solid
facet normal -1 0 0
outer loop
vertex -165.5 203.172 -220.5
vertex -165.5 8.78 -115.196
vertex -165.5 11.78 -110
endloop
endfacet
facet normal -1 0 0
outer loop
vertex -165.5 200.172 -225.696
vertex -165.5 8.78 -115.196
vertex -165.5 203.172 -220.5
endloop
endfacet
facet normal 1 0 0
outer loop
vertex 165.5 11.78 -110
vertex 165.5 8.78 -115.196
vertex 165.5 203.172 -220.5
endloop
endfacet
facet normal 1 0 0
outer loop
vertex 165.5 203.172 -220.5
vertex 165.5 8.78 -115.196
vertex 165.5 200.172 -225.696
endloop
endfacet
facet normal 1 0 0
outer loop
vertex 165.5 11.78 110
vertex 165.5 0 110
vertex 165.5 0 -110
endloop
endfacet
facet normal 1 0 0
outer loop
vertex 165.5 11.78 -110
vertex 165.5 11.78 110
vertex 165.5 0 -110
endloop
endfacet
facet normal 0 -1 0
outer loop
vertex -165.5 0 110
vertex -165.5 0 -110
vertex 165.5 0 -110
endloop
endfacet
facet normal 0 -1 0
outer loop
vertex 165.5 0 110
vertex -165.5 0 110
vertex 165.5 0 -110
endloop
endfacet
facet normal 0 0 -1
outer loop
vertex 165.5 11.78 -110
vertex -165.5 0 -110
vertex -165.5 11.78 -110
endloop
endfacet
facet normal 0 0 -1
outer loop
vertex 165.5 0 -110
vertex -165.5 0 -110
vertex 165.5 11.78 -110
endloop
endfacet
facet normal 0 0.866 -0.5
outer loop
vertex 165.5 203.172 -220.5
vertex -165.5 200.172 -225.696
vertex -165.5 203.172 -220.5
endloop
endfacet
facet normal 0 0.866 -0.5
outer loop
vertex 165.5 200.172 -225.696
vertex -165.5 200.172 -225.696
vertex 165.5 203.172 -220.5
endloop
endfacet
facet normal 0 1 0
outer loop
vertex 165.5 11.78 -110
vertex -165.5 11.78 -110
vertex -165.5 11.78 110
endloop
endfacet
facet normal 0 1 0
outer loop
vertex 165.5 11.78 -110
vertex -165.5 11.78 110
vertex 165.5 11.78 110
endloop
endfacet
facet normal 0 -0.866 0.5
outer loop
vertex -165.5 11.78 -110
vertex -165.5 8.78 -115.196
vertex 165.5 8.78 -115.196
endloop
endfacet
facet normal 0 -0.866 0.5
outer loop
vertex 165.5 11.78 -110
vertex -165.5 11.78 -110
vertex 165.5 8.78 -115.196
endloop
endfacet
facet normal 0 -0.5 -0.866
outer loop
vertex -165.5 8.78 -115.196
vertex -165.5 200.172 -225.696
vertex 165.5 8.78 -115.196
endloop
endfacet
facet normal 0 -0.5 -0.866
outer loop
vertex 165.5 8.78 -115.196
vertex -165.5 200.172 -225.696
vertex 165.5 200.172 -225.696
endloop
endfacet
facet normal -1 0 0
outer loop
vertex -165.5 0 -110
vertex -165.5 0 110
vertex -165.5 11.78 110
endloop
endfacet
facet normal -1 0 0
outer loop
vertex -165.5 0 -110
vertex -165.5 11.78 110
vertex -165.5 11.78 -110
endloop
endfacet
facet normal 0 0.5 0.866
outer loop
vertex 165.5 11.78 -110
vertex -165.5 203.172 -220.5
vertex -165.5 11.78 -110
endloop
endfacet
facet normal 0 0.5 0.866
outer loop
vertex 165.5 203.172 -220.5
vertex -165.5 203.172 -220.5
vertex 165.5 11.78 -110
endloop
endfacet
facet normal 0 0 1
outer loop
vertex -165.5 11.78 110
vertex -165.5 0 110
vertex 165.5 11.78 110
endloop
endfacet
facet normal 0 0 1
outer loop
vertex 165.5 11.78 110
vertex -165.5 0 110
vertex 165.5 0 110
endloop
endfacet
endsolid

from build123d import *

# Parameters (mm, degrees)
SKETCH1_W             = 331
SKETCH1_H             = 220
BOSS_EXTRUDE1_DEPTH   = 11.78
SKETCH2_W             = 331
SKETCH2_H             = 221
BOSS_EXTRUDE2_DEPTH   = 6
BODY_MOVE_COPY2_ANGLE = 30


with BuildPart() as part:
    # Sketch1 → Boss-Extrude1 (new body)
    with BuildSketch(Plane(origin=(0, 0, 0), x_dir=(1, 0, 0), z_dir=(0, 1, 0))):
        Rectangle(SKETCH1_W, SKETCH1_H)
    extrude(amount=BOSS_EXTRUDE1_DEPTH)


with BuildPart() as body_2:
    # Sketch2 → Boss-Extrude2 (new body)
    with BuildSketch(Plane.XY):
        Rectangle(SKETCH2_W, SKETCH2_H)
    extrude(amount=BOSS_EXTRUDE2_DEPTH)


with BuildPart() as body_2_1:
    # Body-Move/Copy2: read off the stored shape, not the designer's step
    # Body-Move/Copy2: moved
    add(body_2.part.moved(Location((0, 175.7017793, -95.3727944))).rotate(Axis((0, 0, 0), (-1, 0, 0)), BODY_MOVE_COPY2_ANGLE))


solid = Compound([part.part, body_2_1.part])
